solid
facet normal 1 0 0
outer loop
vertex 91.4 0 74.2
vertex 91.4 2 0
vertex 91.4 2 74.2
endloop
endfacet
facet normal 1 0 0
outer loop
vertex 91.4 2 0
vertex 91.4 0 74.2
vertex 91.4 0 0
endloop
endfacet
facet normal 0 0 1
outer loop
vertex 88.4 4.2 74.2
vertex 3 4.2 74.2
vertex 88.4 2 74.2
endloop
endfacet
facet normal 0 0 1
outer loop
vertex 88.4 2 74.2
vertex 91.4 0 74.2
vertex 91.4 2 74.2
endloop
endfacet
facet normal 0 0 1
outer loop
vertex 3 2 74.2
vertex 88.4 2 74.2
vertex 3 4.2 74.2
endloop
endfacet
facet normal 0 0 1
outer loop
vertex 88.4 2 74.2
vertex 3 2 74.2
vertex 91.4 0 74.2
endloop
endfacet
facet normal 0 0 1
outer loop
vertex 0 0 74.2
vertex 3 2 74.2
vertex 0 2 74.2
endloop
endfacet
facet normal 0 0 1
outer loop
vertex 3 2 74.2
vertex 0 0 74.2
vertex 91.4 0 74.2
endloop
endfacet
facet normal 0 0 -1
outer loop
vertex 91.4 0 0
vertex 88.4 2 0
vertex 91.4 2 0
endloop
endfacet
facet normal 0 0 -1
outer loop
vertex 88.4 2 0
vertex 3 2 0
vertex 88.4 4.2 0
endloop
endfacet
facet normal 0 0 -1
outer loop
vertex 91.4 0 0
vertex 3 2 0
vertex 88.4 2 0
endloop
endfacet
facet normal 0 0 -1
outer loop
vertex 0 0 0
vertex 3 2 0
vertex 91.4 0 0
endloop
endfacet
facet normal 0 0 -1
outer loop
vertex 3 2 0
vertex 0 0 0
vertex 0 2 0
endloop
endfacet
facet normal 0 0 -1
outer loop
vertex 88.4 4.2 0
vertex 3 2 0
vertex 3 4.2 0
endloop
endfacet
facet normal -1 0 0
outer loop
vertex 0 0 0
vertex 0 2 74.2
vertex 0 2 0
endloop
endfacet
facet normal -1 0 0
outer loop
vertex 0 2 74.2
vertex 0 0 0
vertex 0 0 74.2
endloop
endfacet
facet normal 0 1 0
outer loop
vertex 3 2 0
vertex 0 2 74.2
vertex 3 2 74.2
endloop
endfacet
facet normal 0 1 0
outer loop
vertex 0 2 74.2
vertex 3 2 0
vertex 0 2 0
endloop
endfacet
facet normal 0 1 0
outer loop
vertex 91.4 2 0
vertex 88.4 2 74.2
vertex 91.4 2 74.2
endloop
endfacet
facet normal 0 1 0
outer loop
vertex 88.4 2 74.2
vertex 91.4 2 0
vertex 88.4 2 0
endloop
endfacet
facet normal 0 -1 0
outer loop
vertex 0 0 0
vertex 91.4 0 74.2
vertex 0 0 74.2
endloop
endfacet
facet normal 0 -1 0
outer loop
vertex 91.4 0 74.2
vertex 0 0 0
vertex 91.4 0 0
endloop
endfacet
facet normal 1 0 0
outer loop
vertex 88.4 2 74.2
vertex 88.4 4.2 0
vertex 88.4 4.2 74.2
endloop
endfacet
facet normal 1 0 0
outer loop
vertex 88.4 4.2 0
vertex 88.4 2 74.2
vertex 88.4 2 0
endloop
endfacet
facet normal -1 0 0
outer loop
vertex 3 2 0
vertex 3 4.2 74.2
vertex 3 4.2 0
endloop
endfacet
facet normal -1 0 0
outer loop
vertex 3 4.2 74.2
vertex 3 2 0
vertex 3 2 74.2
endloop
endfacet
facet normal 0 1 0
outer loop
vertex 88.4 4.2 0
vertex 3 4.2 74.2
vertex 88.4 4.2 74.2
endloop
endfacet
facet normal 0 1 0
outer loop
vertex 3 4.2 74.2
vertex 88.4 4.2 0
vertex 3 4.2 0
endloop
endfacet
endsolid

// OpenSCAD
// Display box back door (SolidWorks part 005). Slides into the grooves on the
// back of the display box: the wide flange rides in the grooves, the narrow
// lip fills the opening flush with the back of the box.
// Frame: X = width, Y = depth (0 = inside face, toward the front), Z = height.

display_door_w = 91.4;       // flange width (rides in the grooves)
display_door_h = 74.2;
display_door_flange_t = 2.0; // flange thickness
display_door_lip_t = 2.2;    // lip thickness (flush with the back)
display_door_lip_inset = 3.0; // lip is narrower than the flange by this much on each side

module display_door() {
  cube([display_door_w, display_door_flange_t, display_door_h]);
  translate([display_door_lip_inset, 0, 0])
    cube([display_door_w - 2 * display_door_lip_inset, display_door_flange_t + display_door_lip_t, display_door_h]);
}

display_door();
